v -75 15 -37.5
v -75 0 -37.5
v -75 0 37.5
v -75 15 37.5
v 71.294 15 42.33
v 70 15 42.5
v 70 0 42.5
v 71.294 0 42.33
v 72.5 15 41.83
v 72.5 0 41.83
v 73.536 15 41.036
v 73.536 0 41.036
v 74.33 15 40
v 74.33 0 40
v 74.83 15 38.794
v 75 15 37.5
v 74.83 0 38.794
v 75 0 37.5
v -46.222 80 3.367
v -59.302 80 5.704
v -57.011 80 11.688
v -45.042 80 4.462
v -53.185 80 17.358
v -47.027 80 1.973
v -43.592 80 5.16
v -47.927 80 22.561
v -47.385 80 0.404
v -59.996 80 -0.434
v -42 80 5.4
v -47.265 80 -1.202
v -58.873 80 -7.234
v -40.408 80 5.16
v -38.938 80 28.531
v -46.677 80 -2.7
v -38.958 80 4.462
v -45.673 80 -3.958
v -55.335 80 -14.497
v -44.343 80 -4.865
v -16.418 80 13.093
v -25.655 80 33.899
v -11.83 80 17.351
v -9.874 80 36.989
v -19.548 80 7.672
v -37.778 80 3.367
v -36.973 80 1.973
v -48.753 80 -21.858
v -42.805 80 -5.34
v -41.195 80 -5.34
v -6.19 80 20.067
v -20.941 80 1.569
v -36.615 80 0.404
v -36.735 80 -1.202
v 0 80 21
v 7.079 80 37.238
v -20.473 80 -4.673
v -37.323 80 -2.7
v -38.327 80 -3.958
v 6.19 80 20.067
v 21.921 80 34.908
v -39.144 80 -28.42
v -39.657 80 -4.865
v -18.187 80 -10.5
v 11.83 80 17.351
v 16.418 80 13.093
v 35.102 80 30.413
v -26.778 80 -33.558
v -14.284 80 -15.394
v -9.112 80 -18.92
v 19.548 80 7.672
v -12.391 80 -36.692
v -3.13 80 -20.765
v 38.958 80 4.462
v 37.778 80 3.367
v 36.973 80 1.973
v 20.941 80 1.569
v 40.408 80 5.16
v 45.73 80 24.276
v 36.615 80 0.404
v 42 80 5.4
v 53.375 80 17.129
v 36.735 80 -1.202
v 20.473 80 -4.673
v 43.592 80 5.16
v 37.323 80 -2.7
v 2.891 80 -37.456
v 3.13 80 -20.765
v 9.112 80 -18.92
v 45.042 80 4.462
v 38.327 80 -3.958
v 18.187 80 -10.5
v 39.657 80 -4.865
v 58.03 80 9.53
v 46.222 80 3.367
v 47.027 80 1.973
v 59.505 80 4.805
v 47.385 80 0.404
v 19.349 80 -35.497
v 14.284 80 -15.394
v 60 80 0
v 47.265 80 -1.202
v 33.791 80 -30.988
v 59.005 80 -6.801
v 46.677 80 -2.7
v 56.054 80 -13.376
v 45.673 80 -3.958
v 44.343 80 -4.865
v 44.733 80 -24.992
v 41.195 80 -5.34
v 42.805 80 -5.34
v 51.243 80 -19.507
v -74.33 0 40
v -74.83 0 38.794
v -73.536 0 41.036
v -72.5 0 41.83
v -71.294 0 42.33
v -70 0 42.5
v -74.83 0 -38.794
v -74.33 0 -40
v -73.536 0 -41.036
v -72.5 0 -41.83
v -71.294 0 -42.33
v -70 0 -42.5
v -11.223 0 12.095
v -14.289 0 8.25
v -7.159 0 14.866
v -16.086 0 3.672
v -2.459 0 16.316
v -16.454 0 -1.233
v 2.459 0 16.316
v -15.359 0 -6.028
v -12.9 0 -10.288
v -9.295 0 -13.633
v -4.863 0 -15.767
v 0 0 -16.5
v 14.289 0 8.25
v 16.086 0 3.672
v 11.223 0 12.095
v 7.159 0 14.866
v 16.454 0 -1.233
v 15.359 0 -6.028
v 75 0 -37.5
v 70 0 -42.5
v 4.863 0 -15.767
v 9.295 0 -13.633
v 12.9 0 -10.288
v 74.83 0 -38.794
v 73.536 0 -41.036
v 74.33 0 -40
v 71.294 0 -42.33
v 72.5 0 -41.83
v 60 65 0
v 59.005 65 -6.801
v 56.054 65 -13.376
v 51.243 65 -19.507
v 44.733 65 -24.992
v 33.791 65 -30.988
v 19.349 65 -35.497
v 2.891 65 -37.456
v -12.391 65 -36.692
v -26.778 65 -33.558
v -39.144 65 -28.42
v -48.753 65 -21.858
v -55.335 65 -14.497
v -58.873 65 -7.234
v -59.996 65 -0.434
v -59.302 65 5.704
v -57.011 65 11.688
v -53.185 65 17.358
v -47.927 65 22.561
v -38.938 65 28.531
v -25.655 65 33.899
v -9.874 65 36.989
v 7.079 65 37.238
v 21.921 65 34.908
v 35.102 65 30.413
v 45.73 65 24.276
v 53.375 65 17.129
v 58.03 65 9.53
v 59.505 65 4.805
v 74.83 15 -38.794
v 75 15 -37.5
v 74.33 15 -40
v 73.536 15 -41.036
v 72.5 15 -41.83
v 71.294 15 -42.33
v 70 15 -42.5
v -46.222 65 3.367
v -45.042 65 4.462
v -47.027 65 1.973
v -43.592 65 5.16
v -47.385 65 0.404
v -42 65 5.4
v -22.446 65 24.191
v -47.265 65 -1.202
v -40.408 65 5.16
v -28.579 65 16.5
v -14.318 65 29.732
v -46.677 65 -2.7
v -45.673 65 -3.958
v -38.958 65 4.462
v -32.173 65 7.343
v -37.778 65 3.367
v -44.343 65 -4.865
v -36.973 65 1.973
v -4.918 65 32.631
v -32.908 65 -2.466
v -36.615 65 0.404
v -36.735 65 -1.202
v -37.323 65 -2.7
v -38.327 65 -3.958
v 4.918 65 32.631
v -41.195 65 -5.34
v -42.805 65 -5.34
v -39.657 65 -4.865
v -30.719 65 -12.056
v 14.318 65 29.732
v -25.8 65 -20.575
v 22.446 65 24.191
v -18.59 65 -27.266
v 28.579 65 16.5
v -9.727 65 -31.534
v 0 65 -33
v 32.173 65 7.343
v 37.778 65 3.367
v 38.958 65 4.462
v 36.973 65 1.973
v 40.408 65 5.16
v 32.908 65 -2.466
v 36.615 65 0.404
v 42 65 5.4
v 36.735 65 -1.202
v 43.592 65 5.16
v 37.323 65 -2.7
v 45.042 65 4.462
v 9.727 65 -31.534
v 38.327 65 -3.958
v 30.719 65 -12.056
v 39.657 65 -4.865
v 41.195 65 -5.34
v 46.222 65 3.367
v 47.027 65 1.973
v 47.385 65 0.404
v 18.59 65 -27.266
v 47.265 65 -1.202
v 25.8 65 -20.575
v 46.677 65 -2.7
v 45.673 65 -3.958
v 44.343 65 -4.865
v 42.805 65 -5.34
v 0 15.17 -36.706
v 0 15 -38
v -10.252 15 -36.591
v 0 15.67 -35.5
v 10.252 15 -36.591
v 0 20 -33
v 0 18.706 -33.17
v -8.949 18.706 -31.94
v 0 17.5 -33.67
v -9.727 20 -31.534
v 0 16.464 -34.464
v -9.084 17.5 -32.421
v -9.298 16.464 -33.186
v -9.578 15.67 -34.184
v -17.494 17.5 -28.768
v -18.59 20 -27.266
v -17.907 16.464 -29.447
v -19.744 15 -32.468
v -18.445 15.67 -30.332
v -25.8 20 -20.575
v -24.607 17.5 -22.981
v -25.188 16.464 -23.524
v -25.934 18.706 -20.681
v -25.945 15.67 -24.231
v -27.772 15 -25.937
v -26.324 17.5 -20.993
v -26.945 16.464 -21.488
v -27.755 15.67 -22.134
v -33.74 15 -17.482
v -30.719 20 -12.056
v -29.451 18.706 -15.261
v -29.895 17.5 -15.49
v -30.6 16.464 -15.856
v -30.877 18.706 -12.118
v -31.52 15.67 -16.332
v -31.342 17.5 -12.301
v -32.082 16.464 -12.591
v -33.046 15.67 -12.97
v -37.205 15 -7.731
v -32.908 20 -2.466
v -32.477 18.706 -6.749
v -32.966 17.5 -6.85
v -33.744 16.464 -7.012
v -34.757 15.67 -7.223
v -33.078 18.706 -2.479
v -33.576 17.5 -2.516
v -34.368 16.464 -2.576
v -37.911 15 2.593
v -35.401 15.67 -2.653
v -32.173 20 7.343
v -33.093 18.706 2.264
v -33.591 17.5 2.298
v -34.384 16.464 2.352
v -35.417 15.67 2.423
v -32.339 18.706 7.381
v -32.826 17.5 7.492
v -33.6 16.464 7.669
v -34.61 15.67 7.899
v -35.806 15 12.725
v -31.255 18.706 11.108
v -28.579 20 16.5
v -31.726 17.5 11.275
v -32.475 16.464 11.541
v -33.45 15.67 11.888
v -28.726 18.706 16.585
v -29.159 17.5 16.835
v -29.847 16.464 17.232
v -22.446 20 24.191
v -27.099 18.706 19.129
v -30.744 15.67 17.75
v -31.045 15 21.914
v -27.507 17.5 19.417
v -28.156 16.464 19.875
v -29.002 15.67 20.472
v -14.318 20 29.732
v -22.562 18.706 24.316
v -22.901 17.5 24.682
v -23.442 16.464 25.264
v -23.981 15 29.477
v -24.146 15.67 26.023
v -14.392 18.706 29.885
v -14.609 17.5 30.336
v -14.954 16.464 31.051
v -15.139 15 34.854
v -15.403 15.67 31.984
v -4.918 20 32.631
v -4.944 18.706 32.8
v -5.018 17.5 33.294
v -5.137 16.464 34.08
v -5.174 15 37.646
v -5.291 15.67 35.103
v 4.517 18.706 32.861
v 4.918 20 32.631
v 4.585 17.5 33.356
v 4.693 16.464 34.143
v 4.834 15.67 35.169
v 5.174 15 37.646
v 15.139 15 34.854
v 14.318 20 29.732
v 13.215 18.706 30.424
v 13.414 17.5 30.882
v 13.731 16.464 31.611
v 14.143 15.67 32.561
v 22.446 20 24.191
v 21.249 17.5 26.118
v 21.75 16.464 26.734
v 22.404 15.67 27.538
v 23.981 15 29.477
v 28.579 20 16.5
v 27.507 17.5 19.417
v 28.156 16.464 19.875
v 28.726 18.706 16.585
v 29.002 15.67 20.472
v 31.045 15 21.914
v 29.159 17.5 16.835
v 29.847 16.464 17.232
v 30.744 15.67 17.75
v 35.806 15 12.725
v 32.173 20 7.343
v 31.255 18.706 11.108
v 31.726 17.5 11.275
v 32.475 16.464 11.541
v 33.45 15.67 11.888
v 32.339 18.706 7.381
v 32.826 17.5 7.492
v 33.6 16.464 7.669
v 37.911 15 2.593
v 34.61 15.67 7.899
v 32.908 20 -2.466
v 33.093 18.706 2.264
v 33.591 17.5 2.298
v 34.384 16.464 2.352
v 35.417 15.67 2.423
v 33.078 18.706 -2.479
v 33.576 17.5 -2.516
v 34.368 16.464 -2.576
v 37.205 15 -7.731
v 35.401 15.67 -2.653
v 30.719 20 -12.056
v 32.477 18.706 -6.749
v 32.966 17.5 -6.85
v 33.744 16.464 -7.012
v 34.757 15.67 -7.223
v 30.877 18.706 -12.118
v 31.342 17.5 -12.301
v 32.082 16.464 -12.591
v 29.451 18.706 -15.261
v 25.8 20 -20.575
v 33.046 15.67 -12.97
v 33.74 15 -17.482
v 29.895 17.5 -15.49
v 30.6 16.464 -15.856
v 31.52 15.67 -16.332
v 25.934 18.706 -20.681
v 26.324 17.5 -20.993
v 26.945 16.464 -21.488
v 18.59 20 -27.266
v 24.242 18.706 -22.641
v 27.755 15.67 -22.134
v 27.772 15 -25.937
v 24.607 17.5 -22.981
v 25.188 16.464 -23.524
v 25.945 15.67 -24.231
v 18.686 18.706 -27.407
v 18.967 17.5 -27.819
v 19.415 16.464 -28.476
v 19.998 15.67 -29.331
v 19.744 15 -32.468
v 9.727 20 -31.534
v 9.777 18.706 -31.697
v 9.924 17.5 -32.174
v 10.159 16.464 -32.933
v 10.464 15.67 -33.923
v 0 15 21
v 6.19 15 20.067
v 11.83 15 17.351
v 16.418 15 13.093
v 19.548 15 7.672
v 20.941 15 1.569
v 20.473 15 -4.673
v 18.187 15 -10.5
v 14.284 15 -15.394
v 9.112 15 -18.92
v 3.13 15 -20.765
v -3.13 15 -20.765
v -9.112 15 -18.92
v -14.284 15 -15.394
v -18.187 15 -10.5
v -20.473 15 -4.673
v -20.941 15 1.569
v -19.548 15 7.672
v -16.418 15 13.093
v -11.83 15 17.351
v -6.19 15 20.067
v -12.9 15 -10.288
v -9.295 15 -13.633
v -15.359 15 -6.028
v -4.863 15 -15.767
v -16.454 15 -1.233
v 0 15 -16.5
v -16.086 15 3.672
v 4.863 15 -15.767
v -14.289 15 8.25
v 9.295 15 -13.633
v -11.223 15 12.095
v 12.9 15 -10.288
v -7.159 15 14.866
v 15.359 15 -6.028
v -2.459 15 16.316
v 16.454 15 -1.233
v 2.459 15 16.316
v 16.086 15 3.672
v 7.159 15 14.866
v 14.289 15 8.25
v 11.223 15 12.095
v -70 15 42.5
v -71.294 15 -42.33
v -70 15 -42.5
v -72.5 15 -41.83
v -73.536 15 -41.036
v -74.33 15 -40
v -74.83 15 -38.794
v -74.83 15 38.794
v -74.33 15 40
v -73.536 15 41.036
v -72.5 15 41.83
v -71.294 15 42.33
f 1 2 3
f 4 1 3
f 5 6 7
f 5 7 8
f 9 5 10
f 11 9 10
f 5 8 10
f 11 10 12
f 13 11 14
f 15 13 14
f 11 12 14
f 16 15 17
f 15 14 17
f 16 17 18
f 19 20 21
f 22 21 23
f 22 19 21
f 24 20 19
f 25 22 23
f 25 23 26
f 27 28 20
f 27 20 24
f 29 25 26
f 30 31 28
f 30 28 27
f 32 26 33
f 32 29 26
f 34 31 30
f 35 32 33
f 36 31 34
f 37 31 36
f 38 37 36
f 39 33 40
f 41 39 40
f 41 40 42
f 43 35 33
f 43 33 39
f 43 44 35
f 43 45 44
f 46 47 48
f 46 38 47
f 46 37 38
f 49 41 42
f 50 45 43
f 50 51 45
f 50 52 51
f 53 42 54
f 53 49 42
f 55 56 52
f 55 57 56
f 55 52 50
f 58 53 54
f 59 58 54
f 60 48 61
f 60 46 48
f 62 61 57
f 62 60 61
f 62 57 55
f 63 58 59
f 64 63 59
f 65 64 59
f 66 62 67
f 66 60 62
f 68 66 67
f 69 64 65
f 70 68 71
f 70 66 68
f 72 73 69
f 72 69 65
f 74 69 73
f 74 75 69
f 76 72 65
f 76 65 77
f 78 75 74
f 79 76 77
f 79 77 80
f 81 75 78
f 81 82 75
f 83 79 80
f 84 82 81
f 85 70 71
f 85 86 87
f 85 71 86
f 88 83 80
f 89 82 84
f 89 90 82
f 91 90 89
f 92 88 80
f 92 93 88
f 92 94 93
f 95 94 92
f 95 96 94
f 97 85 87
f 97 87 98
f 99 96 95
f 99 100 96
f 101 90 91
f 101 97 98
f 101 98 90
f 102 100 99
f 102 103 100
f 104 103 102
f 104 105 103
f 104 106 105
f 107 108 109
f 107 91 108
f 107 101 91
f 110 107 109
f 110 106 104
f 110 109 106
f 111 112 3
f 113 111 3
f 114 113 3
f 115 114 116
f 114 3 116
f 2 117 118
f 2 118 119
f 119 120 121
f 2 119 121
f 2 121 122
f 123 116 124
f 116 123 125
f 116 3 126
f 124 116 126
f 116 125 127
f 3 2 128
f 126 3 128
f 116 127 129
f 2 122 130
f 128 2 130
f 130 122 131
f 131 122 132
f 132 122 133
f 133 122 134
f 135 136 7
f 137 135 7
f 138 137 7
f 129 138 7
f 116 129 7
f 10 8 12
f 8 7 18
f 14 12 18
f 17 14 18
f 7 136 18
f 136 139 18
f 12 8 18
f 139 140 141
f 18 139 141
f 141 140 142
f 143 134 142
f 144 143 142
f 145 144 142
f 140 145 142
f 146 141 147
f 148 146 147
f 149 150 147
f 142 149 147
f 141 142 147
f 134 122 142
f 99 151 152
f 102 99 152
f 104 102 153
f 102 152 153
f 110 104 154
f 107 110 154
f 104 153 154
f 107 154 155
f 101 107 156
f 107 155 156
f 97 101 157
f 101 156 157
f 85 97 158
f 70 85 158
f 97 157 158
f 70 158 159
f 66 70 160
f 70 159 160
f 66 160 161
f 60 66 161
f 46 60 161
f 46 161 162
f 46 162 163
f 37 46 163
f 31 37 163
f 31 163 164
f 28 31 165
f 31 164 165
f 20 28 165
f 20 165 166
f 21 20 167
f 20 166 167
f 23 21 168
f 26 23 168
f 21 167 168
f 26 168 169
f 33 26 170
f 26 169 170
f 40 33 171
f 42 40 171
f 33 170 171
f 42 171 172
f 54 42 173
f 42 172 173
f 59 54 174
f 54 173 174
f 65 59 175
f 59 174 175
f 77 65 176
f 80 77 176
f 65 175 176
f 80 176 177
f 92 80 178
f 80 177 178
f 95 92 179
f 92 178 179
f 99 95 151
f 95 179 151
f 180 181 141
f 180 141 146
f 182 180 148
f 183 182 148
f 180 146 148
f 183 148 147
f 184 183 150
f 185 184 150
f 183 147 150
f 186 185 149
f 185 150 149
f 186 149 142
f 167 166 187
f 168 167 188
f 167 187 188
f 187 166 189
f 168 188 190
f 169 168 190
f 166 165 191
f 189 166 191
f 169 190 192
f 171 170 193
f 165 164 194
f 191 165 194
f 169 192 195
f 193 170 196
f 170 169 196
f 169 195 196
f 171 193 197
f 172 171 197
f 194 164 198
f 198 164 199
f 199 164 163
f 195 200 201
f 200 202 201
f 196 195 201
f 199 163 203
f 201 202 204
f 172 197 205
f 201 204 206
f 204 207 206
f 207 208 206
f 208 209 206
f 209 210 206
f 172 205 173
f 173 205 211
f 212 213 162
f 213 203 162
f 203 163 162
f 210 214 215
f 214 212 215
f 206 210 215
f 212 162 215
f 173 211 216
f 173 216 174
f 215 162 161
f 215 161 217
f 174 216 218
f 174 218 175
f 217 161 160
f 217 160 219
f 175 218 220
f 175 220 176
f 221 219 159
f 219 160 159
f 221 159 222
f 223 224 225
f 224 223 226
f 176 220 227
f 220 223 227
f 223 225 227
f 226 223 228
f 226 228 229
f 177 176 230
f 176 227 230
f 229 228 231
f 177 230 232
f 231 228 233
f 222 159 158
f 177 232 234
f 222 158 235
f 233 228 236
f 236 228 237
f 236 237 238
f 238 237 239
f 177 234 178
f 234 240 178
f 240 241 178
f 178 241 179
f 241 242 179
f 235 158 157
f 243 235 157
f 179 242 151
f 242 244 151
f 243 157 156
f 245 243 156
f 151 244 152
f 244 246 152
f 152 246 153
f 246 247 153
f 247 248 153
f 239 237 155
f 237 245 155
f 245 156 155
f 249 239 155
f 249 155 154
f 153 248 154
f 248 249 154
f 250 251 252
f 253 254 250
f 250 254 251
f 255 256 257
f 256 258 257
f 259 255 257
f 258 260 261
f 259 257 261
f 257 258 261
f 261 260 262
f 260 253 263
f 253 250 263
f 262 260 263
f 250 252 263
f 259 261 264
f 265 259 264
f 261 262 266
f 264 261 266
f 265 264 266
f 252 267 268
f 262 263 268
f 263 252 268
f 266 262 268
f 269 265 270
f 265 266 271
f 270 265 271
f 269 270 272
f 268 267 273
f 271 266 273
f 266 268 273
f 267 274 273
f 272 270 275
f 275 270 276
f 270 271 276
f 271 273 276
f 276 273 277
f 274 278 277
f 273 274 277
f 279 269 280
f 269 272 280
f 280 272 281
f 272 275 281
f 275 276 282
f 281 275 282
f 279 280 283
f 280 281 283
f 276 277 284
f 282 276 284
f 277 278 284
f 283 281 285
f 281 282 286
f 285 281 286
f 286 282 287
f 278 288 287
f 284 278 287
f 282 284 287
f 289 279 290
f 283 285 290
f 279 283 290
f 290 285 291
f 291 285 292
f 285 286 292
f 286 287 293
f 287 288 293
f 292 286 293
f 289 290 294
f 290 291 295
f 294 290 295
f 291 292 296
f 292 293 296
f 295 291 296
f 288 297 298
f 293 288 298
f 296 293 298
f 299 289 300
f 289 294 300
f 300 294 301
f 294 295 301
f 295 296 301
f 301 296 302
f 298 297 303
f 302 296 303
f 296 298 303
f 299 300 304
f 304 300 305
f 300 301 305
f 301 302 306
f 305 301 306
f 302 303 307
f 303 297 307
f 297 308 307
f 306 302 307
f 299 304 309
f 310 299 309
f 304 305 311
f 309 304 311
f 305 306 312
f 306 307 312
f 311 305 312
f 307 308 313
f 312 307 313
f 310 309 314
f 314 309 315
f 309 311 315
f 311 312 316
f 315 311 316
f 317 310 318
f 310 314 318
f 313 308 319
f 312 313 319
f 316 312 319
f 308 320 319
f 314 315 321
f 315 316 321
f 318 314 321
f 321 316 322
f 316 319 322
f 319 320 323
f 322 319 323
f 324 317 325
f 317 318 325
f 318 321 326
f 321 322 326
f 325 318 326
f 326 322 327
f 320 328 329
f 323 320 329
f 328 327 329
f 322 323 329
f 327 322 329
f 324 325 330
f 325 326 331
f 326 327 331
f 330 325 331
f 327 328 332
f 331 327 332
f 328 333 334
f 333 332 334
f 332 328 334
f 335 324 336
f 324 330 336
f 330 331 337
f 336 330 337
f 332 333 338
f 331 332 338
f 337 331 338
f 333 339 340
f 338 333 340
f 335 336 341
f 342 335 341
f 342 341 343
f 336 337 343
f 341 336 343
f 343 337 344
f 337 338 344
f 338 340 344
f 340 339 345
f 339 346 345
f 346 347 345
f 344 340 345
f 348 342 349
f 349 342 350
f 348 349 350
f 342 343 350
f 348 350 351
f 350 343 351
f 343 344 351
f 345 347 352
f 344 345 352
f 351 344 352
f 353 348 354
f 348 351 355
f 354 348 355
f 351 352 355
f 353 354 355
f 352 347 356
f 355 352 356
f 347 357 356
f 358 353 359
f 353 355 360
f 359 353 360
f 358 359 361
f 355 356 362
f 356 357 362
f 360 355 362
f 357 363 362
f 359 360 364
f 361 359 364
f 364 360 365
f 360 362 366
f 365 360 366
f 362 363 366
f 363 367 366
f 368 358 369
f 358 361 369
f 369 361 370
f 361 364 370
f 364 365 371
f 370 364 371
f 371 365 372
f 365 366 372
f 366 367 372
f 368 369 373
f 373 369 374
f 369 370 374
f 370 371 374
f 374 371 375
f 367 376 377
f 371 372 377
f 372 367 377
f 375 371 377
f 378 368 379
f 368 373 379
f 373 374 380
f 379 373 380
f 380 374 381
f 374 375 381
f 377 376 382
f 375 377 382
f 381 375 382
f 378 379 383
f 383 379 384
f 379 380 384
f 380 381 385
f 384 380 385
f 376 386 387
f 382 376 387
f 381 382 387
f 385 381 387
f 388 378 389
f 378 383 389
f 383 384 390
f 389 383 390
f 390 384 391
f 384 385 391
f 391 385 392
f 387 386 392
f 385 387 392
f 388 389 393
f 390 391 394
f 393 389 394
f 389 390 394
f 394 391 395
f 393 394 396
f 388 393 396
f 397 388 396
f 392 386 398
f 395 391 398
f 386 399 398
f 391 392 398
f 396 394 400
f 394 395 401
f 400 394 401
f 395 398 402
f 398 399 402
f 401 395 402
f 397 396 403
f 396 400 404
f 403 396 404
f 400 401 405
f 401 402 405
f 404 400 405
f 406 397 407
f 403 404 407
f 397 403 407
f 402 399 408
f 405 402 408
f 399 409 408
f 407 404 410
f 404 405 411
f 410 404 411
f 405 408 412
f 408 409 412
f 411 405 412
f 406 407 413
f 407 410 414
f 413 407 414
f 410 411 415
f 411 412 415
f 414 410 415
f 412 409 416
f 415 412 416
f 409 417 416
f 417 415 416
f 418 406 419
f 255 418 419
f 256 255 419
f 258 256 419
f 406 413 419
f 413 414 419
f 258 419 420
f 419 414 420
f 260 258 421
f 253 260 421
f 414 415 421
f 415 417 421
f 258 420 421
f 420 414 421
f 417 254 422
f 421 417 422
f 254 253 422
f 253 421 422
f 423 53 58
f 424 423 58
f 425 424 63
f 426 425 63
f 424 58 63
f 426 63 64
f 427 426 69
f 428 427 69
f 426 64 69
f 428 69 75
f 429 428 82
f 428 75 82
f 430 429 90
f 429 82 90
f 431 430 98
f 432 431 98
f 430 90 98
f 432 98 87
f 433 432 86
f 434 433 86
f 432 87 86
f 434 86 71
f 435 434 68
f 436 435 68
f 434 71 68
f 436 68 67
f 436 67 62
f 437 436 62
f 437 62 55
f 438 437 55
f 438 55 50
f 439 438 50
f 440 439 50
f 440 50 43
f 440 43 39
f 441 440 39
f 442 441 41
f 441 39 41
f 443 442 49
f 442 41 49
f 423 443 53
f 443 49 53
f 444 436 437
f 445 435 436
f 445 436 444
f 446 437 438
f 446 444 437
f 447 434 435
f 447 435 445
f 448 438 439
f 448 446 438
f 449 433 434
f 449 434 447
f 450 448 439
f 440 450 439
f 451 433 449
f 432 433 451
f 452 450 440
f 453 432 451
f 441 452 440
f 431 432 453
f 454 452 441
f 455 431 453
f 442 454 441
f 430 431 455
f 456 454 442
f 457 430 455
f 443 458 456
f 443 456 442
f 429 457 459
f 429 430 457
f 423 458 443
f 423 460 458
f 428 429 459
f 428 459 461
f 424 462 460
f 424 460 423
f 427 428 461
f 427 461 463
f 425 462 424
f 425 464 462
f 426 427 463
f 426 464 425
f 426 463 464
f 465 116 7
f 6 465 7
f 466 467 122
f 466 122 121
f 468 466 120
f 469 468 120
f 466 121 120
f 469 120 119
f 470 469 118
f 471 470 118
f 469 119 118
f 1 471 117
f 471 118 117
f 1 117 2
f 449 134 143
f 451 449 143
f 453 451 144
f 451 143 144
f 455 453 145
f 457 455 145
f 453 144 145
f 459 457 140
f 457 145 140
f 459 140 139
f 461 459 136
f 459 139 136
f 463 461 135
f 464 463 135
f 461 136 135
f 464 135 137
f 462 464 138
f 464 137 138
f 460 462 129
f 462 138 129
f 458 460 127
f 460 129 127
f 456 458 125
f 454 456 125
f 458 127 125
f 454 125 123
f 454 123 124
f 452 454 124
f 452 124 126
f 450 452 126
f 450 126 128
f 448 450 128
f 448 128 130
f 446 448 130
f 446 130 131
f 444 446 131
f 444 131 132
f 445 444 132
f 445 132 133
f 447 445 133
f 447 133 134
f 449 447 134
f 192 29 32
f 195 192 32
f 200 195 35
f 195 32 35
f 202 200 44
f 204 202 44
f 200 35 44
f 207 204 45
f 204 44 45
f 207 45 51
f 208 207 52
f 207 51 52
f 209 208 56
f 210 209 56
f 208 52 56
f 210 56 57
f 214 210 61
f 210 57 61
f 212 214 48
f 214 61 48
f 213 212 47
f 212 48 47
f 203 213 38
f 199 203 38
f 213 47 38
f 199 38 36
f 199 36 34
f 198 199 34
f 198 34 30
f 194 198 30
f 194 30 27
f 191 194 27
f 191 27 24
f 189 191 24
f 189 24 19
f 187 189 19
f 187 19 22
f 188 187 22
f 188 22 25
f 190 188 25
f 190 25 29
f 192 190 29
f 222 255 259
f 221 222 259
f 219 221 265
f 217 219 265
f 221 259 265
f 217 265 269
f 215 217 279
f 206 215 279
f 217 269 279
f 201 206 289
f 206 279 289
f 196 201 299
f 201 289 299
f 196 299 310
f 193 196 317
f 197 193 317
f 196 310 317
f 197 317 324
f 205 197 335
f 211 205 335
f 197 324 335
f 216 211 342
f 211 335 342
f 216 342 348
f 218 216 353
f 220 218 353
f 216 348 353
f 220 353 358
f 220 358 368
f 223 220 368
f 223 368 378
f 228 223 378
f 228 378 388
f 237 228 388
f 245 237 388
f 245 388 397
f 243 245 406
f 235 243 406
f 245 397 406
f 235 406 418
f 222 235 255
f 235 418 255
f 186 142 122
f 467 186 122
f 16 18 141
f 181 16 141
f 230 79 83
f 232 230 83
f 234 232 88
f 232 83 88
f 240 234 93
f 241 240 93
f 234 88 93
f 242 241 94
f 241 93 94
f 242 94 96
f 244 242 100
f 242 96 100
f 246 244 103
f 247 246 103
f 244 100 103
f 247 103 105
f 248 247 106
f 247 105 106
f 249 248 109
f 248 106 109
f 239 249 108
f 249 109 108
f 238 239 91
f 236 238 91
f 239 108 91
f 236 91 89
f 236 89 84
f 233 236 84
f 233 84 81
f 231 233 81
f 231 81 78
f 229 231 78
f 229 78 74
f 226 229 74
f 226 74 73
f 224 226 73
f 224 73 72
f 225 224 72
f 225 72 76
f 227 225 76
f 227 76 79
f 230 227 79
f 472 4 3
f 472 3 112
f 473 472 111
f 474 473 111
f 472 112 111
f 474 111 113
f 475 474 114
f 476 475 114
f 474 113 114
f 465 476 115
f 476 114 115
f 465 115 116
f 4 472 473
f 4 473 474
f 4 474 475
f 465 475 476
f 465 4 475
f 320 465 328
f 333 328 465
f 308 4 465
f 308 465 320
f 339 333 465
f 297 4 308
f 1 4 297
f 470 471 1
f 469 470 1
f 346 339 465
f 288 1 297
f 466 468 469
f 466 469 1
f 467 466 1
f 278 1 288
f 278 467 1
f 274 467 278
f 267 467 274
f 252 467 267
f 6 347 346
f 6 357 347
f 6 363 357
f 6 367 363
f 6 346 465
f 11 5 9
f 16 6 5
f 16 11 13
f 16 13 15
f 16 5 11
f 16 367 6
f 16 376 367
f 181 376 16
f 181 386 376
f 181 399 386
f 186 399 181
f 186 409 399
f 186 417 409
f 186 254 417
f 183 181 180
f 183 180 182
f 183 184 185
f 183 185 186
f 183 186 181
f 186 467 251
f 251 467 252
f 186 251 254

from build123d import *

# Parameters (mm, degrees)
EXTRUDE_1_DEPTH     = 15
SKETCH_2_R          = 33
EXTRUDE_2_DEPTH     = 50
SKETCH_3_RX         = 60
SKETCH_3_RY         = 37.5
EXTRUDE_3_DEPTH     = 15
SKETCH_4_R          = 21
CUT_EXTRUDE_1_DEPTH = 65
CUT_EXTRUDE_2_REACH = 119.606
SKETCH_5_R          = 16.5
CUT_EXTRUDE_3_REACH = 119.606
SKETCH_6_R          = 5.4
FILLET_1_R          = 5


with BuildPart() as part:
    # 草图1 → 凸台-拉伸1 (new body)
    with BuildSketch(Plane(origin=(0, 0, 0), x_dir=(1, 0, 0), z_dir=(0, 1, 0))):
        with BuildLine():
            Line((-70, -42.5), (70, -42.5))
            ThreePointArc((70, -42.5), (73.535533906, -41.035533906), (75, -37.5))
            Line((75, -37.5), (75, 37.5))
            ThreePointArc((75, 37.5), (73.535533906, 41.035533906), (70, 42.5))
            Line((70, 42.5), (-70, 42.5))
            ThreePointArc((-70, 42.5), (-73.535533906, 41.035533906), (-75, 37.5))
            Line((-75, 37.5), (-75, -37.5))
            ThreePointArc((-75, -37.5), (-73.535533906, -41.035533906), (-70, -42.5))
        make_face()
    extrude(amount=EXTRUDE_1_DEPTH)

    # 草图2 → 凸台-拉伸2 (add)
    with BuildSketch(Plane(origin=(0, 15, 0), x_dir=(1, 0, 0), z_dir=(0, 1, 0))):
        with Locations(Location((0, 0, 0), (0, 0, 90))):
            Circle(SKETCH_2_R)
    extrude(amount=EXTRUDE_2_DEPTH)

    # 草图3 → 凸台-拉伸3 (add)
    with BuildSketch(Plane(origin=(0, 65, 0), x_dir=(1, 0, 0), z_dir=(0, 1, 0))):
        with Locations((0, 0)):
            Ellipse(SKETCH_3_RX, SKETCH_3_RY)
    extrude(amount=EXTRUDE_3_DEPTH)

    # 草图4 → 切除-拉伸1 (cut)
    with BuildSketch(Plane(origin=(0, 80, 0), x_dir=(1, 0, 0), z_dir=(0, 1, 0))):
        with Locations(Location((0, 0, 0), (0, 0, 270))):
            Circle(SKETCH_4_R)
    extrude(amount=-CUT_EXTRUDE_1_DEPTH, mode=Mode.SUBTRACT)

    # 草图5 → 切除-拉伸2 (cut, up to next)
    with BuildSketch(Plane.XZ, mode=Mode.PRIVATE) as cut_extrude_2_sk1:
        with Locations(Location((0, 0, 0), (0, 0, 270))):
            Circle(SKETCH_5_R)
    cut_extrude_2_tool1 = extrude(cut_extrude_2_sk1.sketch, amount=-CUT_EXTRUDE_2_REACH, mode=Mode.PRIVATE) & part.part
    add(cut_extrude_2_tool1.solids().sort_by_distance((0, 0, 0))[0], mode=Mode.SUBTRACT)

    # 草图6 → 切除-拉伸3 (cut, up to next)
    with BuildSketch(Plane(origin=(0, 80, 0), x_dir=(1, 0, 0), z_dir=(0, 1, 0)), mode=Mode.PRIVATE) as cut_extrude_3_sk1:
        with Locations(Location((42, 0, 0), (0, 0, 270))):
            Circle(SKETCH_6_R)
    cut_extrude_3_tool1 = extrude(cut_extrude_3_sk1.sketch, amount=-CUT_EXTRUDE_3_REACH, mode=Mode.PRIVATE) & part.part
    # 草图6 → 切除-拉伸3 (cut, up to next)
    with BuildSketch(Plane(origin=(0, 80, 0), x_dir=(1, 0, 0), z_dir=(0, 1, 0)), mode=Mode.PRIVATE) as cut_extrude_3_sk2:
        with Locations(Location((-42, 0, 0), (0, 0, 270))):
            Circle(SKETCH_6_R)
    cut_extrude_3_tool2 = extrude(cut_extrude_3_sk2.sketch, amount=-CUT_EXTRUDE_3_REACH, mode=Mode.PRIVATE) & part.part
    add(cut_extrude_3_tool1.solids().sort_by_distance((42, 80, 0))[0], mode=Mode.SUBTRACT)
    add(cut_extrude_3_tool2.solids().sort_by_distance((-42, 80, 0))[0], mode=Mode.SUBTRACT)

    # 圆角1
    fillet_1_edges = [part.edges().sort_by_distance(p)[0] for p in [
        (0, 15, 33),
    ]]
    fillet(fillet_1_edges, radius=FILLET_1_R)


solid = part.part
